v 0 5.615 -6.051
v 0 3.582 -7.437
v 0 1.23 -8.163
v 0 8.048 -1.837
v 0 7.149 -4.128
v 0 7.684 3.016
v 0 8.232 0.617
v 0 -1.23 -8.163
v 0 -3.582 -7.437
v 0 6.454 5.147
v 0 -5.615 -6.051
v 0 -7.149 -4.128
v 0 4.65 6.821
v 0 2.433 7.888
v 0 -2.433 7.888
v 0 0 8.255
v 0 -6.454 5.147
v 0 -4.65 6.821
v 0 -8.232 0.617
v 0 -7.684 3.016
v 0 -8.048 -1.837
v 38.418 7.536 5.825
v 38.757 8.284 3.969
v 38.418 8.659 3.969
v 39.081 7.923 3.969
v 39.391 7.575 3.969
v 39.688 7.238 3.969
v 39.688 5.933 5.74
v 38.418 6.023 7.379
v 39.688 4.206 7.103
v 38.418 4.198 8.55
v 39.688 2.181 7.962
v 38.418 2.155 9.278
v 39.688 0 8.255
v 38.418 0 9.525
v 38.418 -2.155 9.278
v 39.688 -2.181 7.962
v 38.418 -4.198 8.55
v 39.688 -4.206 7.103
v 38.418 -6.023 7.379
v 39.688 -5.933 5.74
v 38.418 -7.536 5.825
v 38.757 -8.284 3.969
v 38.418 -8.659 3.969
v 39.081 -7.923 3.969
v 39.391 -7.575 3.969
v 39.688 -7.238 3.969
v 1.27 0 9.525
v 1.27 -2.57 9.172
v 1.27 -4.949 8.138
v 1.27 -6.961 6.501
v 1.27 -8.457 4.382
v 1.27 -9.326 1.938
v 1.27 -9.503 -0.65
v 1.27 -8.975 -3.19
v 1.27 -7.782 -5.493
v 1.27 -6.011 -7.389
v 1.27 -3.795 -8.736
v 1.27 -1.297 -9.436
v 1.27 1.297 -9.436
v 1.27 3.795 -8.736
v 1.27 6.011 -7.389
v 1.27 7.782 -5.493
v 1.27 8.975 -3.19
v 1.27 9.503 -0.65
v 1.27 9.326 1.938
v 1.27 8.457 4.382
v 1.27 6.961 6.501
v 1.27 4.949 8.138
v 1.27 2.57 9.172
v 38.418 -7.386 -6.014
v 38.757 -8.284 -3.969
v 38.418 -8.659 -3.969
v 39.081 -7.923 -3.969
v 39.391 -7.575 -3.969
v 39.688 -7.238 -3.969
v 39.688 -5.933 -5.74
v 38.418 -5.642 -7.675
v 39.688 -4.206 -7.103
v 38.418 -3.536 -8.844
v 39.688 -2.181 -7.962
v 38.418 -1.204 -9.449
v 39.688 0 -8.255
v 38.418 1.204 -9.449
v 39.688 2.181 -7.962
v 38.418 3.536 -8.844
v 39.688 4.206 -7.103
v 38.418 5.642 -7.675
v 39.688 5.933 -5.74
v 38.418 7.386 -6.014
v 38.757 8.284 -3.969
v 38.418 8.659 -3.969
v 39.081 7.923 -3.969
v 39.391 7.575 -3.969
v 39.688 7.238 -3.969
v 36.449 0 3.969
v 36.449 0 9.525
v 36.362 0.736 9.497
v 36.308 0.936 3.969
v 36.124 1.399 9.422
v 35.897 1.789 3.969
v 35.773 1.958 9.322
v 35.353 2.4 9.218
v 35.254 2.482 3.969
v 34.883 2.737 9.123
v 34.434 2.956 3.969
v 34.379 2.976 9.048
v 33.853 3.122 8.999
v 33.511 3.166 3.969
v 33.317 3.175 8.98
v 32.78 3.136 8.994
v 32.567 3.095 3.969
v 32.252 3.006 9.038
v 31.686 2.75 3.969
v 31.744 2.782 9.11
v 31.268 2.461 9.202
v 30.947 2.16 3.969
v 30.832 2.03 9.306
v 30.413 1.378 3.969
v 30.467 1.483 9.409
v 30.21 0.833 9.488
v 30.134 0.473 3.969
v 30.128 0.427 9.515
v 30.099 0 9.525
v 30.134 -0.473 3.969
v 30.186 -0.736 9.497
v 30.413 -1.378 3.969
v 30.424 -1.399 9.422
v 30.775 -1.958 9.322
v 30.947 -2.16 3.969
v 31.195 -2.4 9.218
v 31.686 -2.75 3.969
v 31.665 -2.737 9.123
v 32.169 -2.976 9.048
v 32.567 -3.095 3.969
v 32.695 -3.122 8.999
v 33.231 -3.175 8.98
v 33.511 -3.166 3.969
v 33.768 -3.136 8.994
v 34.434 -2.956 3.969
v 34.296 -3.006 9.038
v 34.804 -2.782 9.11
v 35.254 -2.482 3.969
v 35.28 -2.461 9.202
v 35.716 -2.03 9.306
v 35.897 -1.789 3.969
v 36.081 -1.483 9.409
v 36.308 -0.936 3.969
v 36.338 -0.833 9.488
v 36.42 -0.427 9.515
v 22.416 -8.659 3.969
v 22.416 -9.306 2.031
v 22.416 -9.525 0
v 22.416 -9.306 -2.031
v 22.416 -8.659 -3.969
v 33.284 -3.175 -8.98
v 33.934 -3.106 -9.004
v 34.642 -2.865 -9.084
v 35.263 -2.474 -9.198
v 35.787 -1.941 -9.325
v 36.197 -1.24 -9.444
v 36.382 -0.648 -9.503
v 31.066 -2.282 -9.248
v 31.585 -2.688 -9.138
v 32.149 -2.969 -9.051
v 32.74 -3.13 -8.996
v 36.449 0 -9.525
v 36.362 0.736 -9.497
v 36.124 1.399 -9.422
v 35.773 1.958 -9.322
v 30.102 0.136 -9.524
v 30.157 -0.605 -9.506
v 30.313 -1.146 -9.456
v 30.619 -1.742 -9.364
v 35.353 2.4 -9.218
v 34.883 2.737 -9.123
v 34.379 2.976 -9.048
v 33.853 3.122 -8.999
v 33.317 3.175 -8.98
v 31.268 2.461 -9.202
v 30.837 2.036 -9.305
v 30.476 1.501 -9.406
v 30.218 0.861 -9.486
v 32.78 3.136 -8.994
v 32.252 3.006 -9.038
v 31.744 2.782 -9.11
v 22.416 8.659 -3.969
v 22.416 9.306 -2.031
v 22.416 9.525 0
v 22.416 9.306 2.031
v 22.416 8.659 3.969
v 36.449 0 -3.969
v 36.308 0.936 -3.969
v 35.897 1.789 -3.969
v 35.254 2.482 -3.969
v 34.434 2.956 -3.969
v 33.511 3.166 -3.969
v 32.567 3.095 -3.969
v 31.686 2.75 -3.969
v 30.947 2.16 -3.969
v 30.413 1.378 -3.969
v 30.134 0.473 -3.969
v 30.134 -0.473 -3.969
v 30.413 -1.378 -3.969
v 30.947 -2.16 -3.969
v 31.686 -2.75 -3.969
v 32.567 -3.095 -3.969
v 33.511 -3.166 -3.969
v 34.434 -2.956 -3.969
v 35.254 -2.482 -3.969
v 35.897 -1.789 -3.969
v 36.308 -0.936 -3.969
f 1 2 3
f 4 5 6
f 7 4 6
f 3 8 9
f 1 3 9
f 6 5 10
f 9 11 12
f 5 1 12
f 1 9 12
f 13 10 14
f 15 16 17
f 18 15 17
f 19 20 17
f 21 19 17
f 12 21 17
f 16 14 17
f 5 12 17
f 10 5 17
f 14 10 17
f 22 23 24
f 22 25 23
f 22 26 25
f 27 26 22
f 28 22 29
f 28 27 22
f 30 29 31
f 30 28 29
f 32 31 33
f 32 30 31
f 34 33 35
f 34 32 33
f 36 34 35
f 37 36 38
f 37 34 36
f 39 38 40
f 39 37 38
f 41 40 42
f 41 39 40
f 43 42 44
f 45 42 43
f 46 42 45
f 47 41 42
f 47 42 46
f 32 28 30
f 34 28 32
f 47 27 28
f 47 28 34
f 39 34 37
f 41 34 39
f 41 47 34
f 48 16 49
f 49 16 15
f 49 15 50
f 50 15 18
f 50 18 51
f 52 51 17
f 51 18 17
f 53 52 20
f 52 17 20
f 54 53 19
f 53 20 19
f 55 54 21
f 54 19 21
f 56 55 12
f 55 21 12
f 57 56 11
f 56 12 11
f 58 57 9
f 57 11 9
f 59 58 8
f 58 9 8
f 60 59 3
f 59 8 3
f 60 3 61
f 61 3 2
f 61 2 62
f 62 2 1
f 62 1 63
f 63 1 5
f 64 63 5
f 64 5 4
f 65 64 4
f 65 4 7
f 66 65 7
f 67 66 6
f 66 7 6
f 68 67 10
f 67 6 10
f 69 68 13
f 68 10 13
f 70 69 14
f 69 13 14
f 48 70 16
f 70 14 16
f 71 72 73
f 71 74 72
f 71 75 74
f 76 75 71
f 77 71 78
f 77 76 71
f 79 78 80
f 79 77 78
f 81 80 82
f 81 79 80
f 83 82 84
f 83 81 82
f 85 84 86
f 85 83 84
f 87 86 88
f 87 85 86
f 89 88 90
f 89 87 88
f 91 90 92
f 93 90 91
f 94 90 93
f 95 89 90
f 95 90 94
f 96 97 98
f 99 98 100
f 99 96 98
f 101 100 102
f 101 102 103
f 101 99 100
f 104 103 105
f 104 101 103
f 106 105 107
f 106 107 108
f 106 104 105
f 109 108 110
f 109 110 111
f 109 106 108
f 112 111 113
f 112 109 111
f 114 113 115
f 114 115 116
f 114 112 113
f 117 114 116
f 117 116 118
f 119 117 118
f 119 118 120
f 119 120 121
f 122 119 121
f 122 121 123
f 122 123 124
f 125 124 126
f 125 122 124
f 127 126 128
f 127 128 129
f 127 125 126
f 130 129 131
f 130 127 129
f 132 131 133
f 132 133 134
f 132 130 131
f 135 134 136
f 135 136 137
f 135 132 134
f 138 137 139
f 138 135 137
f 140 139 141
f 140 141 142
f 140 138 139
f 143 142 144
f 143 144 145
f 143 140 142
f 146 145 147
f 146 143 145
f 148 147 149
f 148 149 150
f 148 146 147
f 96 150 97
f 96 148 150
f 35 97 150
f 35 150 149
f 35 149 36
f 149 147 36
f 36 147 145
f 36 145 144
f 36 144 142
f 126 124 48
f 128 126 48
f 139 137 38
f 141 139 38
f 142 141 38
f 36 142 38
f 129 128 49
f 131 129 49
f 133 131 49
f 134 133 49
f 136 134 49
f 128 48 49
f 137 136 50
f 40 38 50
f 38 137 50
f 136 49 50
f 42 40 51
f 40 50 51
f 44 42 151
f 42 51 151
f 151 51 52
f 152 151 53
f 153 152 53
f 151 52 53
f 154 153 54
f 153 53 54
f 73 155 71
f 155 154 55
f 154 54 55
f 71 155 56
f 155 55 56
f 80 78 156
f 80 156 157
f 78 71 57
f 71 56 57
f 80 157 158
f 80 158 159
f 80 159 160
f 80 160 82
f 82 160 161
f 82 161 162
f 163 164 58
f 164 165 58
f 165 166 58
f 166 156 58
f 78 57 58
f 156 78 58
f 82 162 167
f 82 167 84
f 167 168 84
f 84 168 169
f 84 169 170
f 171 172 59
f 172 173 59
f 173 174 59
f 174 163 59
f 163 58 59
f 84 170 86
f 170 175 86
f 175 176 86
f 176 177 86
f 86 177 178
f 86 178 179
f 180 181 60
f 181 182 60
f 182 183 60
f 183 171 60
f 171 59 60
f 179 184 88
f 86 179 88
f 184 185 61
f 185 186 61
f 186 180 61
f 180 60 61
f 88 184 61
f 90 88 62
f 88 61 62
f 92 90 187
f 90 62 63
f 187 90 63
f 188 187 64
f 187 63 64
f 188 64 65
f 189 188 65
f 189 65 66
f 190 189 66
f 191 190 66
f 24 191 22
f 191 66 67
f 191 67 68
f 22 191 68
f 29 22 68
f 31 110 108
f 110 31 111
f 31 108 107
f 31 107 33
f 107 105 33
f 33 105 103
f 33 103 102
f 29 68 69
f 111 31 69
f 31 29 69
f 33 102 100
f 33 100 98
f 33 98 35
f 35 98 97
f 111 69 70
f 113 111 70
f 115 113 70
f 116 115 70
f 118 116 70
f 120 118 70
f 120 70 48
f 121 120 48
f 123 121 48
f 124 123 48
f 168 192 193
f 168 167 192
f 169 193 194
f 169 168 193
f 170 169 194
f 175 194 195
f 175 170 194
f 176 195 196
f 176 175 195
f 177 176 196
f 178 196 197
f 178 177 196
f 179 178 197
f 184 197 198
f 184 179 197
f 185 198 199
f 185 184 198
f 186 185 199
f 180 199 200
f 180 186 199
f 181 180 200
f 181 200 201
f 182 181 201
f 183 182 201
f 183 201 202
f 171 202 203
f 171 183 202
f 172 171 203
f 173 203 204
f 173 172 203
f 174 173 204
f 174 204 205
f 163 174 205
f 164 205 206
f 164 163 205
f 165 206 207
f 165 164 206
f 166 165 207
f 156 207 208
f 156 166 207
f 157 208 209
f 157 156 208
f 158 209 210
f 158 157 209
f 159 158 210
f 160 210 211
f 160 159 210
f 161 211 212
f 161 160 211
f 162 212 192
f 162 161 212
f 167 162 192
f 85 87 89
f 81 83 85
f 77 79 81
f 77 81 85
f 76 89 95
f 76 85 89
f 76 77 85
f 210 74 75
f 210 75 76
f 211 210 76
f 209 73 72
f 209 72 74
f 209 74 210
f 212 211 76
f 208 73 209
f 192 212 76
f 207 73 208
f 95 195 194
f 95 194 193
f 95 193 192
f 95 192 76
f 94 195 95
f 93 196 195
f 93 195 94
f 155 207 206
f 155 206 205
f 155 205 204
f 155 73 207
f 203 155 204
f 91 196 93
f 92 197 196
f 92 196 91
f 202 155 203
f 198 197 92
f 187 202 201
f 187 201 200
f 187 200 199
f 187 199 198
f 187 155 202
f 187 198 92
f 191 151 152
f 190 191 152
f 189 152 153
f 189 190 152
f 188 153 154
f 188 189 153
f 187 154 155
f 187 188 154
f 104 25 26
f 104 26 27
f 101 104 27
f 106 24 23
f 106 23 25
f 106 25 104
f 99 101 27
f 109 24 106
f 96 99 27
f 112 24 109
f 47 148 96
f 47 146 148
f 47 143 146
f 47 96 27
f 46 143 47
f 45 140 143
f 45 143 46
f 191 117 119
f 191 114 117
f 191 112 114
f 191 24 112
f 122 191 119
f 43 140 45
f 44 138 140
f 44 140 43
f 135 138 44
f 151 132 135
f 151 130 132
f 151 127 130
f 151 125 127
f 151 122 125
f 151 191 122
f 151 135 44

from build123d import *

# Parameters (mm, degrees)
SKETCH1_R               = 9.525
BASE_EXTRUDE_DEPTH      = 39.6875
CUT_EXTRUDE1_START      = -17.272
CUT_EXTRUDE1_DEPTH      = 17.272
CUT_EXTRUDE2_DEPTH      = 42.911202634
CUT_EXTRUDE2_DEPTH_BACK = 42.911202634
SKETCH3_R               = 3.175
CHAMFER1_SIZE           = 1.27


with BuildPart() as part:
    # Sketch1 → Base-Extrude (new body)
    with BuildSketch(Plane(origin=(0, 0, 0), x_dir=(0, 0, -1), z_dir=(1, 0, 0))):
        with Locations(Location((0, 0, 0), (0, 0, 180))):
            Circle(SKETCH1_R)
    extrude(amount=BASE_EXTRUDE_DEPTH)

    # Sketch2 → Cut-Extrude1 (cut)
    with BuildSketch(Plane(origin=(39.6875, 0, 0), x_dir=(0, 0, -1), z_dir=(1, 0, 0)).offset(CUT_EXTRUDE1_START)):
        with BuildLine():
            Line((-3.96875, 8.658790241), (-3.96875, -8.658790241))
            ThreePointArc((-3.96875, -8.658790241), (0, -9.525), (3.96875, -8.658790241))
            Line((3.96875, -8.658790241), (3.96875, 8.658790241))
            ThreePointArc((3.96875, 8.658790241), (0, 9.525), (-3.96875, 8.658790241))
        make_face()
    extrude(amount=CUT_EXTRUDE1_DEPTH, mode=Mode.SUBTRACT)

    # Sketch3 → Cut-Extrude2 (cut, two sides: drawn at the far end of the back side and taken through both)
    with BuildSketch(Plane.XY.offset(-CUT_EXTRUDE2_DEPTH_BACK)):
        with Locations((33.274, 0)):
            Circle(SKETCH3_R)
    extrude(amount=CUT_EXTRUDE2_DEPTH + CUT_EXTRUDE2_DEPTH_BACK, mode=Mode.SUBTRACT)

    # Chamfer1
    chamfer1_edges = [part.edges().sort_by_distance(p)[0] for p in [
        (0, 0, -9.525),
        (39.6875, -5.144087929, 8.016482045),
        (39.6875, 0, -9.525),
    ]]
    chamfer(chamfer1_edges, length=CHAMFER1_SIZE)


solid = part.part
